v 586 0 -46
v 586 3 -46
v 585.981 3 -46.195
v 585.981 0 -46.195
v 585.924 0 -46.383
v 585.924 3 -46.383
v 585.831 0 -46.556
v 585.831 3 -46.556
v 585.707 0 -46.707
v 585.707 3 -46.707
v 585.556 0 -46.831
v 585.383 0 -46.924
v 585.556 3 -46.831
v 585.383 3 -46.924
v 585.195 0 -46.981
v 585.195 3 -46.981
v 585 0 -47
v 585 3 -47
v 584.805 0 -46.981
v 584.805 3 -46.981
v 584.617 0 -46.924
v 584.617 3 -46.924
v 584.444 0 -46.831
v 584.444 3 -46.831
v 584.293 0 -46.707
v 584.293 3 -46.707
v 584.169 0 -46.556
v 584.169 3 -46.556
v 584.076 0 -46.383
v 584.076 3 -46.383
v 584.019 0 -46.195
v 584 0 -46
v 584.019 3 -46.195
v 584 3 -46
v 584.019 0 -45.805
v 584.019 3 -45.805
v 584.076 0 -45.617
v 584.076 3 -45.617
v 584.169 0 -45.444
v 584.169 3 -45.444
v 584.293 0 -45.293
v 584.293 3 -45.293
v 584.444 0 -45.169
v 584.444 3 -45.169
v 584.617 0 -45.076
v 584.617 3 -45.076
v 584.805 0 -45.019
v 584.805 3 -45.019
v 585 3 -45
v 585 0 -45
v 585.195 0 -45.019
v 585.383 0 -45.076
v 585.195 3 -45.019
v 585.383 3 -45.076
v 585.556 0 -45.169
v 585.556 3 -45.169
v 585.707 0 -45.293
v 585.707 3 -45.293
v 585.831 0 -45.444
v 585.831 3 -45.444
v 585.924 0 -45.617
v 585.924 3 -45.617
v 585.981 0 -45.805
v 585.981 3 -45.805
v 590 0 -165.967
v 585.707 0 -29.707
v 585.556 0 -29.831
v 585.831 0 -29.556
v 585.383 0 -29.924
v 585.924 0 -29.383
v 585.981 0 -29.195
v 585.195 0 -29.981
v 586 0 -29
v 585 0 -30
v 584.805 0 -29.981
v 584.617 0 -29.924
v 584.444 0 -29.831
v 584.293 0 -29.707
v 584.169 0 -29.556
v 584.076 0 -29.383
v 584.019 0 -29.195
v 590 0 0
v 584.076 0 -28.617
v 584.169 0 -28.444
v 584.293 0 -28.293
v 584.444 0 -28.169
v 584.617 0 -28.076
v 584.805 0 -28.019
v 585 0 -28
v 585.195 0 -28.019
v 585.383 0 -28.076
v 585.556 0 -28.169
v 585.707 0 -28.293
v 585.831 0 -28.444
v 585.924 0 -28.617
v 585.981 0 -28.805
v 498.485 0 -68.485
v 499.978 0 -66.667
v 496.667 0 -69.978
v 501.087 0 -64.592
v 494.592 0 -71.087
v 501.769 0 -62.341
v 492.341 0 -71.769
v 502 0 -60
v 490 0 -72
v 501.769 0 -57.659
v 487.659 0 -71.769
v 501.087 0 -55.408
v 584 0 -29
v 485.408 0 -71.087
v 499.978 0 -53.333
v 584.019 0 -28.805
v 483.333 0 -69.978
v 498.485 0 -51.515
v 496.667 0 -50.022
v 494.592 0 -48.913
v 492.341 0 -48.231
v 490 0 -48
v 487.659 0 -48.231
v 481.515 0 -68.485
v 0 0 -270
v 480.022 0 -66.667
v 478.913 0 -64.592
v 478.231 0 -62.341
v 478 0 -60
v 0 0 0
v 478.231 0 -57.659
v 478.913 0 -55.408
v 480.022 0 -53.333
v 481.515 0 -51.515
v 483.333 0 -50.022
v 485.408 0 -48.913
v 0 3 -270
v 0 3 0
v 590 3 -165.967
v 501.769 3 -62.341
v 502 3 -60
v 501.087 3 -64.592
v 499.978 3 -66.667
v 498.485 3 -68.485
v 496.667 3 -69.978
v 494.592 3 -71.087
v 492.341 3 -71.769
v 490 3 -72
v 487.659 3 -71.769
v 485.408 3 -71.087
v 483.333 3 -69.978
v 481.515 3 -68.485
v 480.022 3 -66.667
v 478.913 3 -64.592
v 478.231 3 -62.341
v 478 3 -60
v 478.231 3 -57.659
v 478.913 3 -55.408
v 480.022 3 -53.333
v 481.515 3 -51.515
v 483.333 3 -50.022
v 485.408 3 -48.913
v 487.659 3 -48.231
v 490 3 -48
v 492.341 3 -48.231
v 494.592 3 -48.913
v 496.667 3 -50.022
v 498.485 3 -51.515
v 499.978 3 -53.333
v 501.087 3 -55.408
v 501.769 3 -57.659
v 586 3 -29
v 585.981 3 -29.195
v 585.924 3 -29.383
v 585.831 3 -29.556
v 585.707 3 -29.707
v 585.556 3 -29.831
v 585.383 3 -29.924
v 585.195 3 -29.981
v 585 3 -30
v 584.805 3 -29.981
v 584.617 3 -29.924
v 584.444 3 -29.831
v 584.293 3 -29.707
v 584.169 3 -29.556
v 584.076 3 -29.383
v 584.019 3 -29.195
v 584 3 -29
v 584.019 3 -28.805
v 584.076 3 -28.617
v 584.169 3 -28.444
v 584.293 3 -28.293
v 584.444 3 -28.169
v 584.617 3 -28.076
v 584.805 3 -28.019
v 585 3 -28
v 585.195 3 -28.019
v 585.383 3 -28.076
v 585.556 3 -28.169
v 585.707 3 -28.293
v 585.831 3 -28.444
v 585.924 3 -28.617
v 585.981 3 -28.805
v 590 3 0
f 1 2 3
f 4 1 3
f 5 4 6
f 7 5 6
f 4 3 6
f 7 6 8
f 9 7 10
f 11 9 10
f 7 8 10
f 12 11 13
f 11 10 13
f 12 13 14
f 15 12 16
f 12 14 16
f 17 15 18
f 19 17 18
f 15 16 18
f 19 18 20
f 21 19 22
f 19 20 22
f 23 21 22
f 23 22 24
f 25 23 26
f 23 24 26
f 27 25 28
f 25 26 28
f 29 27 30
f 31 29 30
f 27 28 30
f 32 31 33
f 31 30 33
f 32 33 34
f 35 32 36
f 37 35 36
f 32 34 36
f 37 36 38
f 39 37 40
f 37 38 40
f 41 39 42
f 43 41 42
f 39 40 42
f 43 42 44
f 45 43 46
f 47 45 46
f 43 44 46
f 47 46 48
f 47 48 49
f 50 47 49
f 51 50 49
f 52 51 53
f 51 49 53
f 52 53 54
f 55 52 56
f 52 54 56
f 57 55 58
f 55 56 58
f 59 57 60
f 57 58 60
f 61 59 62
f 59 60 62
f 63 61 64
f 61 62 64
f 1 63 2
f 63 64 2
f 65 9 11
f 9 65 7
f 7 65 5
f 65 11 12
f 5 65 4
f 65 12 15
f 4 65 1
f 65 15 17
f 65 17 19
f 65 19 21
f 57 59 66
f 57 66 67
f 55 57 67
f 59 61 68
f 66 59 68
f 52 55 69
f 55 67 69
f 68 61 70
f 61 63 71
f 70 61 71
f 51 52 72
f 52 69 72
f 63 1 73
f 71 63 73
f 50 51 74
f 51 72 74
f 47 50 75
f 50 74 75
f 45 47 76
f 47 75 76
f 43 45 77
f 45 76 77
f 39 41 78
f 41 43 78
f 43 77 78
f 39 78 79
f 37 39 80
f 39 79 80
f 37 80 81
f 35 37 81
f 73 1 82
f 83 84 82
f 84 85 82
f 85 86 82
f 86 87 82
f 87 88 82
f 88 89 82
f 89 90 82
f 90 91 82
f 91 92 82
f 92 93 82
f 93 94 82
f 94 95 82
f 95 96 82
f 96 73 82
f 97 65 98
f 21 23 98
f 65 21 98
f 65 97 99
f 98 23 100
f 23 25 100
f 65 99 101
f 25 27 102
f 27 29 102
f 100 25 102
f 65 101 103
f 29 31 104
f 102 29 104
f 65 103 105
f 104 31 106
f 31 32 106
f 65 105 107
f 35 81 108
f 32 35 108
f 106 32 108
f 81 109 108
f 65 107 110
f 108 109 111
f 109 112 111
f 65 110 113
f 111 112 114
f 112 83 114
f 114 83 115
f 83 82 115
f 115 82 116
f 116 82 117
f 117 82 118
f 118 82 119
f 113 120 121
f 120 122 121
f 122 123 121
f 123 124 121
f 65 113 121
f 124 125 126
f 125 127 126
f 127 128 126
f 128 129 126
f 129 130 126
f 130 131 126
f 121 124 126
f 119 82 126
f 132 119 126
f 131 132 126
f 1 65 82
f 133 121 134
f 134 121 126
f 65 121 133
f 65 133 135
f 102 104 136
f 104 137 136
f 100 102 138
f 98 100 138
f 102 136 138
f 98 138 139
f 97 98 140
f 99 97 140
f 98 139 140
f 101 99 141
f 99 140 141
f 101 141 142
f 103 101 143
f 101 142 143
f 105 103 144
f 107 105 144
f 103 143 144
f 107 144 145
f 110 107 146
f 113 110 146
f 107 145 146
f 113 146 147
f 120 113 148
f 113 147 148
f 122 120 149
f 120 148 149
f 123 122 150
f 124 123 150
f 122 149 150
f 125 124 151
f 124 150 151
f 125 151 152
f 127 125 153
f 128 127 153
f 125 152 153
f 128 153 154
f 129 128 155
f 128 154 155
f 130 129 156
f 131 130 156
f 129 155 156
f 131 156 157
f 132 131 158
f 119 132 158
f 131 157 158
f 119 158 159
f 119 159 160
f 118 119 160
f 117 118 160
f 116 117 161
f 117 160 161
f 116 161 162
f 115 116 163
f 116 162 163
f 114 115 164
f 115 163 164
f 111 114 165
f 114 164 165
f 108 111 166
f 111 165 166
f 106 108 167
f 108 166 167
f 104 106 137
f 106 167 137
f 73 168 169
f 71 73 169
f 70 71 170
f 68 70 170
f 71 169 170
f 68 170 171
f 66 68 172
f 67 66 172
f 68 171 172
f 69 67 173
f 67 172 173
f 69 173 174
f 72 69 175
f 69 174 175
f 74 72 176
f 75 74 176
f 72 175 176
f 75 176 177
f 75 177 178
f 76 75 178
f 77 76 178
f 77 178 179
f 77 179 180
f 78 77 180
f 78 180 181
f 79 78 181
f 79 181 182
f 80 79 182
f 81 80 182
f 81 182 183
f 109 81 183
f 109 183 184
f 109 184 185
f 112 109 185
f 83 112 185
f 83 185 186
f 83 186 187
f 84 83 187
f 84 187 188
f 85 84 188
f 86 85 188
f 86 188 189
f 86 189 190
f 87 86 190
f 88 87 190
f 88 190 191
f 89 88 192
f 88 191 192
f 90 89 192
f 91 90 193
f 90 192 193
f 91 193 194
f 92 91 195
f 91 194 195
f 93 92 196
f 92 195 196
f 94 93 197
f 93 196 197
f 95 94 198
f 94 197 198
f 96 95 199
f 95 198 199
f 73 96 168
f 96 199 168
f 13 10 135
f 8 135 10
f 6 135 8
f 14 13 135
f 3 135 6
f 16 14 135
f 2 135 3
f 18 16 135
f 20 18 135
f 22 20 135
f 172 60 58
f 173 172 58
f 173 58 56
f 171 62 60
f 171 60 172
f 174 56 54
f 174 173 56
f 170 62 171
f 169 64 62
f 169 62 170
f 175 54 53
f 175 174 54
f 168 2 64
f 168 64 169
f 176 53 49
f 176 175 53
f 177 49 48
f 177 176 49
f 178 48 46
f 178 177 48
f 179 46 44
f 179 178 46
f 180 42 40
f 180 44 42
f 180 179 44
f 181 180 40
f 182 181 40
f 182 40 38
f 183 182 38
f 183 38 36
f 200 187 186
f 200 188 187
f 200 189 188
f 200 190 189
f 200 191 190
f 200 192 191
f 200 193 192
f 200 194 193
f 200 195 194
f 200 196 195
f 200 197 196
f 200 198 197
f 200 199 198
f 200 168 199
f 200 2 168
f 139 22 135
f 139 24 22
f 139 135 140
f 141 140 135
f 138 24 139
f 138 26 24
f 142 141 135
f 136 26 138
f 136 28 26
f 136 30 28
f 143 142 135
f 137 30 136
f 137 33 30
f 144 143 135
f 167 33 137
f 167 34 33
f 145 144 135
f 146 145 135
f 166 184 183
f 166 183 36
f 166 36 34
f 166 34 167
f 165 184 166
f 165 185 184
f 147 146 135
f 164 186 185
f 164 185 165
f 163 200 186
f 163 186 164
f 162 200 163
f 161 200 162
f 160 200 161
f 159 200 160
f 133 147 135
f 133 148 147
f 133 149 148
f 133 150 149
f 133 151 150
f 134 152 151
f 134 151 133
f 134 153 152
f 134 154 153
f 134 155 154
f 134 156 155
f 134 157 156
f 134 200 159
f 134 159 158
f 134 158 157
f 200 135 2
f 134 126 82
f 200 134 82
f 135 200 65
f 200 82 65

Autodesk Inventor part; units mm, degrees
ref_plane "YZ Plane" through (0, 0, 0) normal (1, 0, 0) x (0, 1, 0)
ref_plane "XZ Plane" through (0, 0, 0) normal (0, 1, 0) x (-1, 0, 0)
ref_plane "XY Plane" through (0, 0, 0) normal (0, 0, 1) x (1, 0, 0)
sketch "Sketch1" plane through (0, 0, 0) normal (0, 1, 0) x (-1, 0, 0)
  line L0 (0, 0) -> (-590, 0)
  line L1 (-590, 0) -> (-590, -165.9671)
  line L2 (-590, -165.9671) -> (0, -165.9671)
  line L3 (0, -165.9671) -> (0, 0)
  line L4 (0, -165.9671) -> (0, -270)
  line L5 (0, -270) -> (-590, -165.9671)
  dimension "d0" = 590
  dimension "d28" = 270
  dimension "d29" = 10
extrude "Extrusion1" add sketch "Sketch1" along normal blind 3
sketch "Sketch3" plane through (0, 3, 0) normal (0, 1, 0) x (1, 0, 0)
  circle A0 centre (585, 29) radius 1
  circle A1 centre (585, 46) radius 1
  line L0 (590, 0) -> (590, 165.9671) projected
  line L1 (0, 0) -> (590, 0) projected
  dimension "d15" = 2
  dimension "d16" = 5
  dimension "d17" = 5
  dimension "d18" = 2
  dimension "d19" = 29
  dimension "d20" = 17
extrude "Extrusion3" cut sketch "Sketch3" along normal through all both and the other way through all
sketch "Sketch4" plane through (0, 3, 0) normal (0, 1, 0) x (1, 0, 0)
  circle A0 centre (490, 60) radius 12
  line L0 (0, 0) -> (590, 0) projected
  line L1 (590, 0) -> (590, 165.9671) projected
  dimension "d23" = 24
  dimension "d24" = 60
  dimension "d25" = 100
extrude "Extrusion4" cut sketch "Sketch4" against normal through all
equation "\"d17\" = d16"
equation "\"d18\" = d15"
properties part number "pinball-case-left-wall-outer"
